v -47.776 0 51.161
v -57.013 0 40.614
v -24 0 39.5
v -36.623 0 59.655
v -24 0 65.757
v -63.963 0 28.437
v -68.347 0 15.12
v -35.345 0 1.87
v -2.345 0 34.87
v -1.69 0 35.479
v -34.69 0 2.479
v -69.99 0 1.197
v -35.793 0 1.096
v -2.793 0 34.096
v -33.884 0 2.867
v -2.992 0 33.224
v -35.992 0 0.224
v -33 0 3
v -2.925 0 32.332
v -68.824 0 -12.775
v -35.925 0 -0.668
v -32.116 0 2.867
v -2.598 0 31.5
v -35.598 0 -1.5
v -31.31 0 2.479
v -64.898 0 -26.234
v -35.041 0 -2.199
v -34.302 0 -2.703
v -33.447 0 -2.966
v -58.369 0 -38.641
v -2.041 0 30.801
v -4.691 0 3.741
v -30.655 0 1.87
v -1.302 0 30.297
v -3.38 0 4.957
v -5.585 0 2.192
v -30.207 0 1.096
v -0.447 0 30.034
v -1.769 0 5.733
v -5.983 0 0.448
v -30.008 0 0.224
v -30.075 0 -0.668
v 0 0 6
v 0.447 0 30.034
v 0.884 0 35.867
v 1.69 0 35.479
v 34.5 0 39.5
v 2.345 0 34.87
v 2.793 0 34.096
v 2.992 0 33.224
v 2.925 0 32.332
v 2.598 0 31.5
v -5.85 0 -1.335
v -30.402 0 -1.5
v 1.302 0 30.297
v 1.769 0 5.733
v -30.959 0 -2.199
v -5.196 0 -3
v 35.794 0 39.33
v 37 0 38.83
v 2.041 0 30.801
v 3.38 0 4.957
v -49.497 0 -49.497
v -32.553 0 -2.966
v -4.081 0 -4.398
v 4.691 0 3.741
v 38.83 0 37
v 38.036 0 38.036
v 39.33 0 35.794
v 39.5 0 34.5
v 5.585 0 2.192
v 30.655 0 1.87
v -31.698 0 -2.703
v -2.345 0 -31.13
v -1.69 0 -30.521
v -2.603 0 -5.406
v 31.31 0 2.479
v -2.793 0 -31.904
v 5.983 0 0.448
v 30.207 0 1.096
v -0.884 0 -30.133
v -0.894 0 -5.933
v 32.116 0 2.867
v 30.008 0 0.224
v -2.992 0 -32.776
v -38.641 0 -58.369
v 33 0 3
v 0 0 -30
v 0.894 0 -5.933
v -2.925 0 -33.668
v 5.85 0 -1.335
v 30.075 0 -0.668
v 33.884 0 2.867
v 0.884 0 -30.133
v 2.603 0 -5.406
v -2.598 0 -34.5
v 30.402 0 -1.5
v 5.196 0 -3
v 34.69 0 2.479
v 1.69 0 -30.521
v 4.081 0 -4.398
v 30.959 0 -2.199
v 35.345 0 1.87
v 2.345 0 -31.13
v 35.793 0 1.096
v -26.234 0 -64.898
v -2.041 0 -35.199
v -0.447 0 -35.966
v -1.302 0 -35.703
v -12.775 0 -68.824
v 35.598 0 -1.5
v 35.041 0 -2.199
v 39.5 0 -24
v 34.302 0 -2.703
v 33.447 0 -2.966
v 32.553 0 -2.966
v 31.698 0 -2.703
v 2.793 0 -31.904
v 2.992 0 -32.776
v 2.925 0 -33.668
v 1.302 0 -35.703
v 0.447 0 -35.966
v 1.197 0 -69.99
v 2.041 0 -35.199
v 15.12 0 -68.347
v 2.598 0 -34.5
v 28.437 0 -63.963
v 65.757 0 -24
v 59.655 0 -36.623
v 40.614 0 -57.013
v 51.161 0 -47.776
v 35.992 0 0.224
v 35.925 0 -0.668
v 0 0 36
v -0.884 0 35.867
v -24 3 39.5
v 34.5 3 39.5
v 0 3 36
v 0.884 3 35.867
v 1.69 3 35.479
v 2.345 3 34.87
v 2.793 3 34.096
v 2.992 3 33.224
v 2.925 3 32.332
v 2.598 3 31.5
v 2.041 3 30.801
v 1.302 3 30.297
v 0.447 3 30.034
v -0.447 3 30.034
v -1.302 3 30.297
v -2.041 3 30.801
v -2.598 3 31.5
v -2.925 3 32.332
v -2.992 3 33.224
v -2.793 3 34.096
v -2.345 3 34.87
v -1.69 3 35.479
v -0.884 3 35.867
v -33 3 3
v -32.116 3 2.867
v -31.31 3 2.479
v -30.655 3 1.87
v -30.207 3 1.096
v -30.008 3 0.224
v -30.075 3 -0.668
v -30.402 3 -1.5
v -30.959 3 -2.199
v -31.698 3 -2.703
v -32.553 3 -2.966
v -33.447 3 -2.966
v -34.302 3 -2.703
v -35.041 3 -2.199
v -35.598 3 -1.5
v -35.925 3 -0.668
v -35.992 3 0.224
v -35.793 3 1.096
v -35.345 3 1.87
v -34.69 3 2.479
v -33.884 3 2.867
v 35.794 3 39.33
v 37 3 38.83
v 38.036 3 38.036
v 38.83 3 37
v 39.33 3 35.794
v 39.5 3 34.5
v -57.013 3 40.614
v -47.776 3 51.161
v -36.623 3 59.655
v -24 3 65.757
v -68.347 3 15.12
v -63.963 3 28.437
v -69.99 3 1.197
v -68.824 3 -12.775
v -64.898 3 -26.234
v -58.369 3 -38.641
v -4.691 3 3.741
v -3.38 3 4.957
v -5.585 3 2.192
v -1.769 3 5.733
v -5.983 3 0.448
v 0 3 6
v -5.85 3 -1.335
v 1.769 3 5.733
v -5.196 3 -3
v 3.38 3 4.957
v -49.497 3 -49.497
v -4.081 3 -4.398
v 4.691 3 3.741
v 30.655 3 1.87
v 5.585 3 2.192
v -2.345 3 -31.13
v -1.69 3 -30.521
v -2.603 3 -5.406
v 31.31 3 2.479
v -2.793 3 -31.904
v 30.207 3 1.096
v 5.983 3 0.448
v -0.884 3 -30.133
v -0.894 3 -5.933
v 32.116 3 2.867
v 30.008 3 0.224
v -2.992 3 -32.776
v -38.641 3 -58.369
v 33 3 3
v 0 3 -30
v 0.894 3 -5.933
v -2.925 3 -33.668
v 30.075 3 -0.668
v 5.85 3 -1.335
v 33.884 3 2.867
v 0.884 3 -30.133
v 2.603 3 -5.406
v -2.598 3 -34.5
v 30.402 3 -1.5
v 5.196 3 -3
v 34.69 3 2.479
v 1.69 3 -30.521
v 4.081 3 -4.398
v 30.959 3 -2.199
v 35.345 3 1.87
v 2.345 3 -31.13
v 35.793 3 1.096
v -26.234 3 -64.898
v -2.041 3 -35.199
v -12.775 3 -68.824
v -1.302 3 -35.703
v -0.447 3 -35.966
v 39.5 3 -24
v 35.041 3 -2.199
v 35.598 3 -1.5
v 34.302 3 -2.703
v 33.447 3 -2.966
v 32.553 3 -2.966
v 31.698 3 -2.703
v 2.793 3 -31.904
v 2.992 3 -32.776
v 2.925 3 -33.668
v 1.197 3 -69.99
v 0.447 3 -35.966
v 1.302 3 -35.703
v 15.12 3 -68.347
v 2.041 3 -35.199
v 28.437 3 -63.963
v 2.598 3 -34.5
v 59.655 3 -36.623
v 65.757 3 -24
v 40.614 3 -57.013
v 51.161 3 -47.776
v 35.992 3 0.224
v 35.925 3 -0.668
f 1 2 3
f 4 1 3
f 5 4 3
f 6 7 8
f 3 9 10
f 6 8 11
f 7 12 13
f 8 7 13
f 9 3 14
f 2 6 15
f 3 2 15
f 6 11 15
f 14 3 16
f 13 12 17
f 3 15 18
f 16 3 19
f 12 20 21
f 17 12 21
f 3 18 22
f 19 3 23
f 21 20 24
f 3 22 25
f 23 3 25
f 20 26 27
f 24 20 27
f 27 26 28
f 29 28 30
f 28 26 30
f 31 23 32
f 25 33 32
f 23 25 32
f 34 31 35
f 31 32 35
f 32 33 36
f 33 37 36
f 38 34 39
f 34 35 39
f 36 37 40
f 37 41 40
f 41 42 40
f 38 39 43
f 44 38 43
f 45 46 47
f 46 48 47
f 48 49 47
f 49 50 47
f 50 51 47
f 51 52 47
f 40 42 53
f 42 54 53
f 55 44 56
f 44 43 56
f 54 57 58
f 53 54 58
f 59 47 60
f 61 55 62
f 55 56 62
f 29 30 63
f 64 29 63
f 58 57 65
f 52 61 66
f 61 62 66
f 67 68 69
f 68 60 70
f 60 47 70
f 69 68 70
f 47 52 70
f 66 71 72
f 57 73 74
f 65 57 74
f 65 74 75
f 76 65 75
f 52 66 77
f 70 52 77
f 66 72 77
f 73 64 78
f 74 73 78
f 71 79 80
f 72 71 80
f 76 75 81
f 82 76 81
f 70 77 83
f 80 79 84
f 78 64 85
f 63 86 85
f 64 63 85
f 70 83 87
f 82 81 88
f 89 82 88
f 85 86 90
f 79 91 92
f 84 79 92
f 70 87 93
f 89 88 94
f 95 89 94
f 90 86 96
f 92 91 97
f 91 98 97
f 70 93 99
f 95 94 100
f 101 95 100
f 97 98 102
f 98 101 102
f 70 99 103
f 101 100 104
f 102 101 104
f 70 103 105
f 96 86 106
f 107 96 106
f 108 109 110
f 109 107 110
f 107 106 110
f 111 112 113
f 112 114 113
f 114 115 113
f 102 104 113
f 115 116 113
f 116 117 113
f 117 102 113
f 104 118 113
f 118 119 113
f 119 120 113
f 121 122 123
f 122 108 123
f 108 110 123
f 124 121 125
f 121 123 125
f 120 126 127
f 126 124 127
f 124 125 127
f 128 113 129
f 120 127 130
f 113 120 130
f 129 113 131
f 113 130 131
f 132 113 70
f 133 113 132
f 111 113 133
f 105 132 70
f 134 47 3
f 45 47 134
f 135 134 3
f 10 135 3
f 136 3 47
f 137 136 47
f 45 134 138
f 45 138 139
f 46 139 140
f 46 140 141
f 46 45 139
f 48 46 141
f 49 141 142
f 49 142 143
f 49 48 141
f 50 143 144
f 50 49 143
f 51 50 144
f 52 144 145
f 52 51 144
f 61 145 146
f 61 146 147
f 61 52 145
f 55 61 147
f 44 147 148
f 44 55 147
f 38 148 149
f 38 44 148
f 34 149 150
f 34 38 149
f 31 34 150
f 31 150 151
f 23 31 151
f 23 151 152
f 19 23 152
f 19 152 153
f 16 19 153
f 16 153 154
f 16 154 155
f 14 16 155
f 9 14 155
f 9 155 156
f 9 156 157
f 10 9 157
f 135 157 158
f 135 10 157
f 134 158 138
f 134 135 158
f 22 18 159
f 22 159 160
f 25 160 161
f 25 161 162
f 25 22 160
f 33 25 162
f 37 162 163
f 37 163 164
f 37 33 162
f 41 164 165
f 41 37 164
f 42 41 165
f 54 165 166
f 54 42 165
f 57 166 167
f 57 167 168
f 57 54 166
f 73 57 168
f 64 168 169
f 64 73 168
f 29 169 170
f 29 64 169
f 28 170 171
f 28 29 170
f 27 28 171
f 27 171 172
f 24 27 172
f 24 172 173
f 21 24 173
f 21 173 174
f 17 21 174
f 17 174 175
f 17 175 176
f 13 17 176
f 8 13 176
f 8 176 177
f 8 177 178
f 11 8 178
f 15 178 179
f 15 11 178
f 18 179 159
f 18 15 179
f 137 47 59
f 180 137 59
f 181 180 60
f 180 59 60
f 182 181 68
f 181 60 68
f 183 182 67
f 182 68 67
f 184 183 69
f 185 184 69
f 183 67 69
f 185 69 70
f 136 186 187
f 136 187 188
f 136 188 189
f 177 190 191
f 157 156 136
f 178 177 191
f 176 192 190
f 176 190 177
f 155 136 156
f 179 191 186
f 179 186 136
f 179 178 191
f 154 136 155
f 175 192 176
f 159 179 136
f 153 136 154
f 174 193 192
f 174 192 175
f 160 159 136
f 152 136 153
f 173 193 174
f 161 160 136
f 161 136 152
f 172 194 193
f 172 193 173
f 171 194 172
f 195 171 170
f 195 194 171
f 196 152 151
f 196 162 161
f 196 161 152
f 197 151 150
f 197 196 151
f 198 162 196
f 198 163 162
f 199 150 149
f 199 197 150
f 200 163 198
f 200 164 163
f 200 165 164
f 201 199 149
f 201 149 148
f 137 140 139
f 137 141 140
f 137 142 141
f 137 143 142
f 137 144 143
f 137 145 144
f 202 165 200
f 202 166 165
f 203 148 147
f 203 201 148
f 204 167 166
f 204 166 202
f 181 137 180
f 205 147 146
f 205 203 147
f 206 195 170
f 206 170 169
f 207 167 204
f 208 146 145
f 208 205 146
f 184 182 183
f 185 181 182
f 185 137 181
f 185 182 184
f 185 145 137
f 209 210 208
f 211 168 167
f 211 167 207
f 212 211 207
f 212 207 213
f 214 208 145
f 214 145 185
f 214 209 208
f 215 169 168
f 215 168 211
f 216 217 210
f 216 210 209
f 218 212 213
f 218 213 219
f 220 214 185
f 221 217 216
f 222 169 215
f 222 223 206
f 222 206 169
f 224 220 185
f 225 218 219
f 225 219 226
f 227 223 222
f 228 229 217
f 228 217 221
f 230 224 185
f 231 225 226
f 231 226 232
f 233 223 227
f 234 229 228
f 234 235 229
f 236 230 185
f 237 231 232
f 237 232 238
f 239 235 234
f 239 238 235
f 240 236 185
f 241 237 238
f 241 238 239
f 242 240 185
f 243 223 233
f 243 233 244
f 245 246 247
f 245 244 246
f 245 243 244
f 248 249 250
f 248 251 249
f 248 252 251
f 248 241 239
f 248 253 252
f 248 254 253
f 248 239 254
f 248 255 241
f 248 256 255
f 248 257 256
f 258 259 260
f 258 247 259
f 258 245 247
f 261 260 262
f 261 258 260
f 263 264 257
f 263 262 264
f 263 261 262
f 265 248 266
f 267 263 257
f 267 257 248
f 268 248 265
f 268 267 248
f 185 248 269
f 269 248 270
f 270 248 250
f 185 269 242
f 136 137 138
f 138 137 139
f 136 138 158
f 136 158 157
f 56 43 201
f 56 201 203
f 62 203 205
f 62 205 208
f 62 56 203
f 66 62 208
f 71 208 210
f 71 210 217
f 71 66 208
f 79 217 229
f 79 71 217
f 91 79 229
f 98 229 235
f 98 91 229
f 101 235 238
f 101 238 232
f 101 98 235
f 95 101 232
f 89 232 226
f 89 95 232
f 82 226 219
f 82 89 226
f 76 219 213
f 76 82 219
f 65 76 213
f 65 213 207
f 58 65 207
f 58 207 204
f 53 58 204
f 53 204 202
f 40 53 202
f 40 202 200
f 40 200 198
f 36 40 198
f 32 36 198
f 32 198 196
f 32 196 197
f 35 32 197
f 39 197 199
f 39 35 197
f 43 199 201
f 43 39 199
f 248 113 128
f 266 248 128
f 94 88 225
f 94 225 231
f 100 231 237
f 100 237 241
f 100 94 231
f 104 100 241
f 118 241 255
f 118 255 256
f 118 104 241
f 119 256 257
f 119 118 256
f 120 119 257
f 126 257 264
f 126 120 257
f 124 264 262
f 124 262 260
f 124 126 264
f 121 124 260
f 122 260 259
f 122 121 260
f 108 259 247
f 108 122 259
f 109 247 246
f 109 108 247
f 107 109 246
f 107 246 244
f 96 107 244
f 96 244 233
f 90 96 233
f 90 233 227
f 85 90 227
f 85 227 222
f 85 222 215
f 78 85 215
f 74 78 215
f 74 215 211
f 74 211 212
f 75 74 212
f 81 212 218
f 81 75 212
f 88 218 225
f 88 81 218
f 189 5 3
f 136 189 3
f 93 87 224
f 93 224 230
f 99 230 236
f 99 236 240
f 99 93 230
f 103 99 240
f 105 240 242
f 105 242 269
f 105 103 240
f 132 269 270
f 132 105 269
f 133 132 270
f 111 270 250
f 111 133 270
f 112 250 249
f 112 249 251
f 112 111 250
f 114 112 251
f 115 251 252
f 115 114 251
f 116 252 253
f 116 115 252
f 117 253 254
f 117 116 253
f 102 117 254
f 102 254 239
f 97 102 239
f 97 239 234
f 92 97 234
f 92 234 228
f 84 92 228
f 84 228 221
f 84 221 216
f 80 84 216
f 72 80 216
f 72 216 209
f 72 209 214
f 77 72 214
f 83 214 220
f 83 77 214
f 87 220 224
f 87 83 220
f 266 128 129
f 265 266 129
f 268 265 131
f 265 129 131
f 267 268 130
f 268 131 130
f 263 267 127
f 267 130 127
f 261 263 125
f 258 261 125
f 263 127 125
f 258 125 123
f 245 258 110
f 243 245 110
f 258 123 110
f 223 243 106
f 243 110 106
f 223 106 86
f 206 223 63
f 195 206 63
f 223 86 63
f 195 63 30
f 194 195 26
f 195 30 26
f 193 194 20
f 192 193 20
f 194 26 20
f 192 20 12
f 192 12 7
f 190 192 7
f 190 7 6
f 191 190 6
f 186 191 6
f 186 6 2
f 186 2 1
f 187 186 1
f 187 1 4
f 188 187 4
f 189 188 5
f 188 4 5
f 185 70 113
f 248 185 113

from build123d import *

# Parameters (mm, degrees)
SKETCH1_R           = 6
SKETCH1_R_2         = 3
BOSS_EXTRUDE1_DEPTH = 3


with BuildPart() as part:
    # Sketch1 → Boss-Extrude1 (new body)
    with BuildSketch(Plane(origin=(0, 0, 0), x_dir=(1, 0, 0), z_dir=(0, 1, 0))):
        with BuildLine():
            Line((24, -39.5), (34.5, -39.5))
            ThreePointArc((34.5, -39.5), (38.035533906, -38.035533906), (39.5, -34.5))
            Line((39.5, -34.5), (39.5, -24))
            Line((39.5, -24), (39.5, 24))
            Line((39.5, 24), (65.757128891, 24))
            ThreePointArc((65.757128891, 24), (-49.497474683, 49.497474683), (-24, -65.757128891))
            Line((-24, -65.757128891), (-24, -39.5))
            Line((-24, -39.5), (24, -39.5))
        make_face()
        with Locations(Location((0, 0, 0), (0, 0, 270))):
            Circle(SKETCH1_R, mode=Mode.SUBTRACT)
        with Locations(Location((33, 0, 0), (0, 0, 270))):
            Circle(SKETCH1_R_2, mode=Mode.SUBTRACT)
        with Locations(Location((0, -33, 0), (0, 0, 270))):
            Circle(SKETCH1_R_2, mode=Mode.SUBTRACT)
        with Locations(Location((-33, 0, 0), (0, 0, 270))):
            Circle(SKETCH1_R_2, mode=Mode.SUBTRACT)
        with Locations(Location((0, 33, 0), (0, 0, 270))):
            Circle(SKETCH1_R_2, mode=Mode.SUBTRACT)
    extrude(amount=BOSS_EXTRUDE1_DEPTH)


solid = part.part
